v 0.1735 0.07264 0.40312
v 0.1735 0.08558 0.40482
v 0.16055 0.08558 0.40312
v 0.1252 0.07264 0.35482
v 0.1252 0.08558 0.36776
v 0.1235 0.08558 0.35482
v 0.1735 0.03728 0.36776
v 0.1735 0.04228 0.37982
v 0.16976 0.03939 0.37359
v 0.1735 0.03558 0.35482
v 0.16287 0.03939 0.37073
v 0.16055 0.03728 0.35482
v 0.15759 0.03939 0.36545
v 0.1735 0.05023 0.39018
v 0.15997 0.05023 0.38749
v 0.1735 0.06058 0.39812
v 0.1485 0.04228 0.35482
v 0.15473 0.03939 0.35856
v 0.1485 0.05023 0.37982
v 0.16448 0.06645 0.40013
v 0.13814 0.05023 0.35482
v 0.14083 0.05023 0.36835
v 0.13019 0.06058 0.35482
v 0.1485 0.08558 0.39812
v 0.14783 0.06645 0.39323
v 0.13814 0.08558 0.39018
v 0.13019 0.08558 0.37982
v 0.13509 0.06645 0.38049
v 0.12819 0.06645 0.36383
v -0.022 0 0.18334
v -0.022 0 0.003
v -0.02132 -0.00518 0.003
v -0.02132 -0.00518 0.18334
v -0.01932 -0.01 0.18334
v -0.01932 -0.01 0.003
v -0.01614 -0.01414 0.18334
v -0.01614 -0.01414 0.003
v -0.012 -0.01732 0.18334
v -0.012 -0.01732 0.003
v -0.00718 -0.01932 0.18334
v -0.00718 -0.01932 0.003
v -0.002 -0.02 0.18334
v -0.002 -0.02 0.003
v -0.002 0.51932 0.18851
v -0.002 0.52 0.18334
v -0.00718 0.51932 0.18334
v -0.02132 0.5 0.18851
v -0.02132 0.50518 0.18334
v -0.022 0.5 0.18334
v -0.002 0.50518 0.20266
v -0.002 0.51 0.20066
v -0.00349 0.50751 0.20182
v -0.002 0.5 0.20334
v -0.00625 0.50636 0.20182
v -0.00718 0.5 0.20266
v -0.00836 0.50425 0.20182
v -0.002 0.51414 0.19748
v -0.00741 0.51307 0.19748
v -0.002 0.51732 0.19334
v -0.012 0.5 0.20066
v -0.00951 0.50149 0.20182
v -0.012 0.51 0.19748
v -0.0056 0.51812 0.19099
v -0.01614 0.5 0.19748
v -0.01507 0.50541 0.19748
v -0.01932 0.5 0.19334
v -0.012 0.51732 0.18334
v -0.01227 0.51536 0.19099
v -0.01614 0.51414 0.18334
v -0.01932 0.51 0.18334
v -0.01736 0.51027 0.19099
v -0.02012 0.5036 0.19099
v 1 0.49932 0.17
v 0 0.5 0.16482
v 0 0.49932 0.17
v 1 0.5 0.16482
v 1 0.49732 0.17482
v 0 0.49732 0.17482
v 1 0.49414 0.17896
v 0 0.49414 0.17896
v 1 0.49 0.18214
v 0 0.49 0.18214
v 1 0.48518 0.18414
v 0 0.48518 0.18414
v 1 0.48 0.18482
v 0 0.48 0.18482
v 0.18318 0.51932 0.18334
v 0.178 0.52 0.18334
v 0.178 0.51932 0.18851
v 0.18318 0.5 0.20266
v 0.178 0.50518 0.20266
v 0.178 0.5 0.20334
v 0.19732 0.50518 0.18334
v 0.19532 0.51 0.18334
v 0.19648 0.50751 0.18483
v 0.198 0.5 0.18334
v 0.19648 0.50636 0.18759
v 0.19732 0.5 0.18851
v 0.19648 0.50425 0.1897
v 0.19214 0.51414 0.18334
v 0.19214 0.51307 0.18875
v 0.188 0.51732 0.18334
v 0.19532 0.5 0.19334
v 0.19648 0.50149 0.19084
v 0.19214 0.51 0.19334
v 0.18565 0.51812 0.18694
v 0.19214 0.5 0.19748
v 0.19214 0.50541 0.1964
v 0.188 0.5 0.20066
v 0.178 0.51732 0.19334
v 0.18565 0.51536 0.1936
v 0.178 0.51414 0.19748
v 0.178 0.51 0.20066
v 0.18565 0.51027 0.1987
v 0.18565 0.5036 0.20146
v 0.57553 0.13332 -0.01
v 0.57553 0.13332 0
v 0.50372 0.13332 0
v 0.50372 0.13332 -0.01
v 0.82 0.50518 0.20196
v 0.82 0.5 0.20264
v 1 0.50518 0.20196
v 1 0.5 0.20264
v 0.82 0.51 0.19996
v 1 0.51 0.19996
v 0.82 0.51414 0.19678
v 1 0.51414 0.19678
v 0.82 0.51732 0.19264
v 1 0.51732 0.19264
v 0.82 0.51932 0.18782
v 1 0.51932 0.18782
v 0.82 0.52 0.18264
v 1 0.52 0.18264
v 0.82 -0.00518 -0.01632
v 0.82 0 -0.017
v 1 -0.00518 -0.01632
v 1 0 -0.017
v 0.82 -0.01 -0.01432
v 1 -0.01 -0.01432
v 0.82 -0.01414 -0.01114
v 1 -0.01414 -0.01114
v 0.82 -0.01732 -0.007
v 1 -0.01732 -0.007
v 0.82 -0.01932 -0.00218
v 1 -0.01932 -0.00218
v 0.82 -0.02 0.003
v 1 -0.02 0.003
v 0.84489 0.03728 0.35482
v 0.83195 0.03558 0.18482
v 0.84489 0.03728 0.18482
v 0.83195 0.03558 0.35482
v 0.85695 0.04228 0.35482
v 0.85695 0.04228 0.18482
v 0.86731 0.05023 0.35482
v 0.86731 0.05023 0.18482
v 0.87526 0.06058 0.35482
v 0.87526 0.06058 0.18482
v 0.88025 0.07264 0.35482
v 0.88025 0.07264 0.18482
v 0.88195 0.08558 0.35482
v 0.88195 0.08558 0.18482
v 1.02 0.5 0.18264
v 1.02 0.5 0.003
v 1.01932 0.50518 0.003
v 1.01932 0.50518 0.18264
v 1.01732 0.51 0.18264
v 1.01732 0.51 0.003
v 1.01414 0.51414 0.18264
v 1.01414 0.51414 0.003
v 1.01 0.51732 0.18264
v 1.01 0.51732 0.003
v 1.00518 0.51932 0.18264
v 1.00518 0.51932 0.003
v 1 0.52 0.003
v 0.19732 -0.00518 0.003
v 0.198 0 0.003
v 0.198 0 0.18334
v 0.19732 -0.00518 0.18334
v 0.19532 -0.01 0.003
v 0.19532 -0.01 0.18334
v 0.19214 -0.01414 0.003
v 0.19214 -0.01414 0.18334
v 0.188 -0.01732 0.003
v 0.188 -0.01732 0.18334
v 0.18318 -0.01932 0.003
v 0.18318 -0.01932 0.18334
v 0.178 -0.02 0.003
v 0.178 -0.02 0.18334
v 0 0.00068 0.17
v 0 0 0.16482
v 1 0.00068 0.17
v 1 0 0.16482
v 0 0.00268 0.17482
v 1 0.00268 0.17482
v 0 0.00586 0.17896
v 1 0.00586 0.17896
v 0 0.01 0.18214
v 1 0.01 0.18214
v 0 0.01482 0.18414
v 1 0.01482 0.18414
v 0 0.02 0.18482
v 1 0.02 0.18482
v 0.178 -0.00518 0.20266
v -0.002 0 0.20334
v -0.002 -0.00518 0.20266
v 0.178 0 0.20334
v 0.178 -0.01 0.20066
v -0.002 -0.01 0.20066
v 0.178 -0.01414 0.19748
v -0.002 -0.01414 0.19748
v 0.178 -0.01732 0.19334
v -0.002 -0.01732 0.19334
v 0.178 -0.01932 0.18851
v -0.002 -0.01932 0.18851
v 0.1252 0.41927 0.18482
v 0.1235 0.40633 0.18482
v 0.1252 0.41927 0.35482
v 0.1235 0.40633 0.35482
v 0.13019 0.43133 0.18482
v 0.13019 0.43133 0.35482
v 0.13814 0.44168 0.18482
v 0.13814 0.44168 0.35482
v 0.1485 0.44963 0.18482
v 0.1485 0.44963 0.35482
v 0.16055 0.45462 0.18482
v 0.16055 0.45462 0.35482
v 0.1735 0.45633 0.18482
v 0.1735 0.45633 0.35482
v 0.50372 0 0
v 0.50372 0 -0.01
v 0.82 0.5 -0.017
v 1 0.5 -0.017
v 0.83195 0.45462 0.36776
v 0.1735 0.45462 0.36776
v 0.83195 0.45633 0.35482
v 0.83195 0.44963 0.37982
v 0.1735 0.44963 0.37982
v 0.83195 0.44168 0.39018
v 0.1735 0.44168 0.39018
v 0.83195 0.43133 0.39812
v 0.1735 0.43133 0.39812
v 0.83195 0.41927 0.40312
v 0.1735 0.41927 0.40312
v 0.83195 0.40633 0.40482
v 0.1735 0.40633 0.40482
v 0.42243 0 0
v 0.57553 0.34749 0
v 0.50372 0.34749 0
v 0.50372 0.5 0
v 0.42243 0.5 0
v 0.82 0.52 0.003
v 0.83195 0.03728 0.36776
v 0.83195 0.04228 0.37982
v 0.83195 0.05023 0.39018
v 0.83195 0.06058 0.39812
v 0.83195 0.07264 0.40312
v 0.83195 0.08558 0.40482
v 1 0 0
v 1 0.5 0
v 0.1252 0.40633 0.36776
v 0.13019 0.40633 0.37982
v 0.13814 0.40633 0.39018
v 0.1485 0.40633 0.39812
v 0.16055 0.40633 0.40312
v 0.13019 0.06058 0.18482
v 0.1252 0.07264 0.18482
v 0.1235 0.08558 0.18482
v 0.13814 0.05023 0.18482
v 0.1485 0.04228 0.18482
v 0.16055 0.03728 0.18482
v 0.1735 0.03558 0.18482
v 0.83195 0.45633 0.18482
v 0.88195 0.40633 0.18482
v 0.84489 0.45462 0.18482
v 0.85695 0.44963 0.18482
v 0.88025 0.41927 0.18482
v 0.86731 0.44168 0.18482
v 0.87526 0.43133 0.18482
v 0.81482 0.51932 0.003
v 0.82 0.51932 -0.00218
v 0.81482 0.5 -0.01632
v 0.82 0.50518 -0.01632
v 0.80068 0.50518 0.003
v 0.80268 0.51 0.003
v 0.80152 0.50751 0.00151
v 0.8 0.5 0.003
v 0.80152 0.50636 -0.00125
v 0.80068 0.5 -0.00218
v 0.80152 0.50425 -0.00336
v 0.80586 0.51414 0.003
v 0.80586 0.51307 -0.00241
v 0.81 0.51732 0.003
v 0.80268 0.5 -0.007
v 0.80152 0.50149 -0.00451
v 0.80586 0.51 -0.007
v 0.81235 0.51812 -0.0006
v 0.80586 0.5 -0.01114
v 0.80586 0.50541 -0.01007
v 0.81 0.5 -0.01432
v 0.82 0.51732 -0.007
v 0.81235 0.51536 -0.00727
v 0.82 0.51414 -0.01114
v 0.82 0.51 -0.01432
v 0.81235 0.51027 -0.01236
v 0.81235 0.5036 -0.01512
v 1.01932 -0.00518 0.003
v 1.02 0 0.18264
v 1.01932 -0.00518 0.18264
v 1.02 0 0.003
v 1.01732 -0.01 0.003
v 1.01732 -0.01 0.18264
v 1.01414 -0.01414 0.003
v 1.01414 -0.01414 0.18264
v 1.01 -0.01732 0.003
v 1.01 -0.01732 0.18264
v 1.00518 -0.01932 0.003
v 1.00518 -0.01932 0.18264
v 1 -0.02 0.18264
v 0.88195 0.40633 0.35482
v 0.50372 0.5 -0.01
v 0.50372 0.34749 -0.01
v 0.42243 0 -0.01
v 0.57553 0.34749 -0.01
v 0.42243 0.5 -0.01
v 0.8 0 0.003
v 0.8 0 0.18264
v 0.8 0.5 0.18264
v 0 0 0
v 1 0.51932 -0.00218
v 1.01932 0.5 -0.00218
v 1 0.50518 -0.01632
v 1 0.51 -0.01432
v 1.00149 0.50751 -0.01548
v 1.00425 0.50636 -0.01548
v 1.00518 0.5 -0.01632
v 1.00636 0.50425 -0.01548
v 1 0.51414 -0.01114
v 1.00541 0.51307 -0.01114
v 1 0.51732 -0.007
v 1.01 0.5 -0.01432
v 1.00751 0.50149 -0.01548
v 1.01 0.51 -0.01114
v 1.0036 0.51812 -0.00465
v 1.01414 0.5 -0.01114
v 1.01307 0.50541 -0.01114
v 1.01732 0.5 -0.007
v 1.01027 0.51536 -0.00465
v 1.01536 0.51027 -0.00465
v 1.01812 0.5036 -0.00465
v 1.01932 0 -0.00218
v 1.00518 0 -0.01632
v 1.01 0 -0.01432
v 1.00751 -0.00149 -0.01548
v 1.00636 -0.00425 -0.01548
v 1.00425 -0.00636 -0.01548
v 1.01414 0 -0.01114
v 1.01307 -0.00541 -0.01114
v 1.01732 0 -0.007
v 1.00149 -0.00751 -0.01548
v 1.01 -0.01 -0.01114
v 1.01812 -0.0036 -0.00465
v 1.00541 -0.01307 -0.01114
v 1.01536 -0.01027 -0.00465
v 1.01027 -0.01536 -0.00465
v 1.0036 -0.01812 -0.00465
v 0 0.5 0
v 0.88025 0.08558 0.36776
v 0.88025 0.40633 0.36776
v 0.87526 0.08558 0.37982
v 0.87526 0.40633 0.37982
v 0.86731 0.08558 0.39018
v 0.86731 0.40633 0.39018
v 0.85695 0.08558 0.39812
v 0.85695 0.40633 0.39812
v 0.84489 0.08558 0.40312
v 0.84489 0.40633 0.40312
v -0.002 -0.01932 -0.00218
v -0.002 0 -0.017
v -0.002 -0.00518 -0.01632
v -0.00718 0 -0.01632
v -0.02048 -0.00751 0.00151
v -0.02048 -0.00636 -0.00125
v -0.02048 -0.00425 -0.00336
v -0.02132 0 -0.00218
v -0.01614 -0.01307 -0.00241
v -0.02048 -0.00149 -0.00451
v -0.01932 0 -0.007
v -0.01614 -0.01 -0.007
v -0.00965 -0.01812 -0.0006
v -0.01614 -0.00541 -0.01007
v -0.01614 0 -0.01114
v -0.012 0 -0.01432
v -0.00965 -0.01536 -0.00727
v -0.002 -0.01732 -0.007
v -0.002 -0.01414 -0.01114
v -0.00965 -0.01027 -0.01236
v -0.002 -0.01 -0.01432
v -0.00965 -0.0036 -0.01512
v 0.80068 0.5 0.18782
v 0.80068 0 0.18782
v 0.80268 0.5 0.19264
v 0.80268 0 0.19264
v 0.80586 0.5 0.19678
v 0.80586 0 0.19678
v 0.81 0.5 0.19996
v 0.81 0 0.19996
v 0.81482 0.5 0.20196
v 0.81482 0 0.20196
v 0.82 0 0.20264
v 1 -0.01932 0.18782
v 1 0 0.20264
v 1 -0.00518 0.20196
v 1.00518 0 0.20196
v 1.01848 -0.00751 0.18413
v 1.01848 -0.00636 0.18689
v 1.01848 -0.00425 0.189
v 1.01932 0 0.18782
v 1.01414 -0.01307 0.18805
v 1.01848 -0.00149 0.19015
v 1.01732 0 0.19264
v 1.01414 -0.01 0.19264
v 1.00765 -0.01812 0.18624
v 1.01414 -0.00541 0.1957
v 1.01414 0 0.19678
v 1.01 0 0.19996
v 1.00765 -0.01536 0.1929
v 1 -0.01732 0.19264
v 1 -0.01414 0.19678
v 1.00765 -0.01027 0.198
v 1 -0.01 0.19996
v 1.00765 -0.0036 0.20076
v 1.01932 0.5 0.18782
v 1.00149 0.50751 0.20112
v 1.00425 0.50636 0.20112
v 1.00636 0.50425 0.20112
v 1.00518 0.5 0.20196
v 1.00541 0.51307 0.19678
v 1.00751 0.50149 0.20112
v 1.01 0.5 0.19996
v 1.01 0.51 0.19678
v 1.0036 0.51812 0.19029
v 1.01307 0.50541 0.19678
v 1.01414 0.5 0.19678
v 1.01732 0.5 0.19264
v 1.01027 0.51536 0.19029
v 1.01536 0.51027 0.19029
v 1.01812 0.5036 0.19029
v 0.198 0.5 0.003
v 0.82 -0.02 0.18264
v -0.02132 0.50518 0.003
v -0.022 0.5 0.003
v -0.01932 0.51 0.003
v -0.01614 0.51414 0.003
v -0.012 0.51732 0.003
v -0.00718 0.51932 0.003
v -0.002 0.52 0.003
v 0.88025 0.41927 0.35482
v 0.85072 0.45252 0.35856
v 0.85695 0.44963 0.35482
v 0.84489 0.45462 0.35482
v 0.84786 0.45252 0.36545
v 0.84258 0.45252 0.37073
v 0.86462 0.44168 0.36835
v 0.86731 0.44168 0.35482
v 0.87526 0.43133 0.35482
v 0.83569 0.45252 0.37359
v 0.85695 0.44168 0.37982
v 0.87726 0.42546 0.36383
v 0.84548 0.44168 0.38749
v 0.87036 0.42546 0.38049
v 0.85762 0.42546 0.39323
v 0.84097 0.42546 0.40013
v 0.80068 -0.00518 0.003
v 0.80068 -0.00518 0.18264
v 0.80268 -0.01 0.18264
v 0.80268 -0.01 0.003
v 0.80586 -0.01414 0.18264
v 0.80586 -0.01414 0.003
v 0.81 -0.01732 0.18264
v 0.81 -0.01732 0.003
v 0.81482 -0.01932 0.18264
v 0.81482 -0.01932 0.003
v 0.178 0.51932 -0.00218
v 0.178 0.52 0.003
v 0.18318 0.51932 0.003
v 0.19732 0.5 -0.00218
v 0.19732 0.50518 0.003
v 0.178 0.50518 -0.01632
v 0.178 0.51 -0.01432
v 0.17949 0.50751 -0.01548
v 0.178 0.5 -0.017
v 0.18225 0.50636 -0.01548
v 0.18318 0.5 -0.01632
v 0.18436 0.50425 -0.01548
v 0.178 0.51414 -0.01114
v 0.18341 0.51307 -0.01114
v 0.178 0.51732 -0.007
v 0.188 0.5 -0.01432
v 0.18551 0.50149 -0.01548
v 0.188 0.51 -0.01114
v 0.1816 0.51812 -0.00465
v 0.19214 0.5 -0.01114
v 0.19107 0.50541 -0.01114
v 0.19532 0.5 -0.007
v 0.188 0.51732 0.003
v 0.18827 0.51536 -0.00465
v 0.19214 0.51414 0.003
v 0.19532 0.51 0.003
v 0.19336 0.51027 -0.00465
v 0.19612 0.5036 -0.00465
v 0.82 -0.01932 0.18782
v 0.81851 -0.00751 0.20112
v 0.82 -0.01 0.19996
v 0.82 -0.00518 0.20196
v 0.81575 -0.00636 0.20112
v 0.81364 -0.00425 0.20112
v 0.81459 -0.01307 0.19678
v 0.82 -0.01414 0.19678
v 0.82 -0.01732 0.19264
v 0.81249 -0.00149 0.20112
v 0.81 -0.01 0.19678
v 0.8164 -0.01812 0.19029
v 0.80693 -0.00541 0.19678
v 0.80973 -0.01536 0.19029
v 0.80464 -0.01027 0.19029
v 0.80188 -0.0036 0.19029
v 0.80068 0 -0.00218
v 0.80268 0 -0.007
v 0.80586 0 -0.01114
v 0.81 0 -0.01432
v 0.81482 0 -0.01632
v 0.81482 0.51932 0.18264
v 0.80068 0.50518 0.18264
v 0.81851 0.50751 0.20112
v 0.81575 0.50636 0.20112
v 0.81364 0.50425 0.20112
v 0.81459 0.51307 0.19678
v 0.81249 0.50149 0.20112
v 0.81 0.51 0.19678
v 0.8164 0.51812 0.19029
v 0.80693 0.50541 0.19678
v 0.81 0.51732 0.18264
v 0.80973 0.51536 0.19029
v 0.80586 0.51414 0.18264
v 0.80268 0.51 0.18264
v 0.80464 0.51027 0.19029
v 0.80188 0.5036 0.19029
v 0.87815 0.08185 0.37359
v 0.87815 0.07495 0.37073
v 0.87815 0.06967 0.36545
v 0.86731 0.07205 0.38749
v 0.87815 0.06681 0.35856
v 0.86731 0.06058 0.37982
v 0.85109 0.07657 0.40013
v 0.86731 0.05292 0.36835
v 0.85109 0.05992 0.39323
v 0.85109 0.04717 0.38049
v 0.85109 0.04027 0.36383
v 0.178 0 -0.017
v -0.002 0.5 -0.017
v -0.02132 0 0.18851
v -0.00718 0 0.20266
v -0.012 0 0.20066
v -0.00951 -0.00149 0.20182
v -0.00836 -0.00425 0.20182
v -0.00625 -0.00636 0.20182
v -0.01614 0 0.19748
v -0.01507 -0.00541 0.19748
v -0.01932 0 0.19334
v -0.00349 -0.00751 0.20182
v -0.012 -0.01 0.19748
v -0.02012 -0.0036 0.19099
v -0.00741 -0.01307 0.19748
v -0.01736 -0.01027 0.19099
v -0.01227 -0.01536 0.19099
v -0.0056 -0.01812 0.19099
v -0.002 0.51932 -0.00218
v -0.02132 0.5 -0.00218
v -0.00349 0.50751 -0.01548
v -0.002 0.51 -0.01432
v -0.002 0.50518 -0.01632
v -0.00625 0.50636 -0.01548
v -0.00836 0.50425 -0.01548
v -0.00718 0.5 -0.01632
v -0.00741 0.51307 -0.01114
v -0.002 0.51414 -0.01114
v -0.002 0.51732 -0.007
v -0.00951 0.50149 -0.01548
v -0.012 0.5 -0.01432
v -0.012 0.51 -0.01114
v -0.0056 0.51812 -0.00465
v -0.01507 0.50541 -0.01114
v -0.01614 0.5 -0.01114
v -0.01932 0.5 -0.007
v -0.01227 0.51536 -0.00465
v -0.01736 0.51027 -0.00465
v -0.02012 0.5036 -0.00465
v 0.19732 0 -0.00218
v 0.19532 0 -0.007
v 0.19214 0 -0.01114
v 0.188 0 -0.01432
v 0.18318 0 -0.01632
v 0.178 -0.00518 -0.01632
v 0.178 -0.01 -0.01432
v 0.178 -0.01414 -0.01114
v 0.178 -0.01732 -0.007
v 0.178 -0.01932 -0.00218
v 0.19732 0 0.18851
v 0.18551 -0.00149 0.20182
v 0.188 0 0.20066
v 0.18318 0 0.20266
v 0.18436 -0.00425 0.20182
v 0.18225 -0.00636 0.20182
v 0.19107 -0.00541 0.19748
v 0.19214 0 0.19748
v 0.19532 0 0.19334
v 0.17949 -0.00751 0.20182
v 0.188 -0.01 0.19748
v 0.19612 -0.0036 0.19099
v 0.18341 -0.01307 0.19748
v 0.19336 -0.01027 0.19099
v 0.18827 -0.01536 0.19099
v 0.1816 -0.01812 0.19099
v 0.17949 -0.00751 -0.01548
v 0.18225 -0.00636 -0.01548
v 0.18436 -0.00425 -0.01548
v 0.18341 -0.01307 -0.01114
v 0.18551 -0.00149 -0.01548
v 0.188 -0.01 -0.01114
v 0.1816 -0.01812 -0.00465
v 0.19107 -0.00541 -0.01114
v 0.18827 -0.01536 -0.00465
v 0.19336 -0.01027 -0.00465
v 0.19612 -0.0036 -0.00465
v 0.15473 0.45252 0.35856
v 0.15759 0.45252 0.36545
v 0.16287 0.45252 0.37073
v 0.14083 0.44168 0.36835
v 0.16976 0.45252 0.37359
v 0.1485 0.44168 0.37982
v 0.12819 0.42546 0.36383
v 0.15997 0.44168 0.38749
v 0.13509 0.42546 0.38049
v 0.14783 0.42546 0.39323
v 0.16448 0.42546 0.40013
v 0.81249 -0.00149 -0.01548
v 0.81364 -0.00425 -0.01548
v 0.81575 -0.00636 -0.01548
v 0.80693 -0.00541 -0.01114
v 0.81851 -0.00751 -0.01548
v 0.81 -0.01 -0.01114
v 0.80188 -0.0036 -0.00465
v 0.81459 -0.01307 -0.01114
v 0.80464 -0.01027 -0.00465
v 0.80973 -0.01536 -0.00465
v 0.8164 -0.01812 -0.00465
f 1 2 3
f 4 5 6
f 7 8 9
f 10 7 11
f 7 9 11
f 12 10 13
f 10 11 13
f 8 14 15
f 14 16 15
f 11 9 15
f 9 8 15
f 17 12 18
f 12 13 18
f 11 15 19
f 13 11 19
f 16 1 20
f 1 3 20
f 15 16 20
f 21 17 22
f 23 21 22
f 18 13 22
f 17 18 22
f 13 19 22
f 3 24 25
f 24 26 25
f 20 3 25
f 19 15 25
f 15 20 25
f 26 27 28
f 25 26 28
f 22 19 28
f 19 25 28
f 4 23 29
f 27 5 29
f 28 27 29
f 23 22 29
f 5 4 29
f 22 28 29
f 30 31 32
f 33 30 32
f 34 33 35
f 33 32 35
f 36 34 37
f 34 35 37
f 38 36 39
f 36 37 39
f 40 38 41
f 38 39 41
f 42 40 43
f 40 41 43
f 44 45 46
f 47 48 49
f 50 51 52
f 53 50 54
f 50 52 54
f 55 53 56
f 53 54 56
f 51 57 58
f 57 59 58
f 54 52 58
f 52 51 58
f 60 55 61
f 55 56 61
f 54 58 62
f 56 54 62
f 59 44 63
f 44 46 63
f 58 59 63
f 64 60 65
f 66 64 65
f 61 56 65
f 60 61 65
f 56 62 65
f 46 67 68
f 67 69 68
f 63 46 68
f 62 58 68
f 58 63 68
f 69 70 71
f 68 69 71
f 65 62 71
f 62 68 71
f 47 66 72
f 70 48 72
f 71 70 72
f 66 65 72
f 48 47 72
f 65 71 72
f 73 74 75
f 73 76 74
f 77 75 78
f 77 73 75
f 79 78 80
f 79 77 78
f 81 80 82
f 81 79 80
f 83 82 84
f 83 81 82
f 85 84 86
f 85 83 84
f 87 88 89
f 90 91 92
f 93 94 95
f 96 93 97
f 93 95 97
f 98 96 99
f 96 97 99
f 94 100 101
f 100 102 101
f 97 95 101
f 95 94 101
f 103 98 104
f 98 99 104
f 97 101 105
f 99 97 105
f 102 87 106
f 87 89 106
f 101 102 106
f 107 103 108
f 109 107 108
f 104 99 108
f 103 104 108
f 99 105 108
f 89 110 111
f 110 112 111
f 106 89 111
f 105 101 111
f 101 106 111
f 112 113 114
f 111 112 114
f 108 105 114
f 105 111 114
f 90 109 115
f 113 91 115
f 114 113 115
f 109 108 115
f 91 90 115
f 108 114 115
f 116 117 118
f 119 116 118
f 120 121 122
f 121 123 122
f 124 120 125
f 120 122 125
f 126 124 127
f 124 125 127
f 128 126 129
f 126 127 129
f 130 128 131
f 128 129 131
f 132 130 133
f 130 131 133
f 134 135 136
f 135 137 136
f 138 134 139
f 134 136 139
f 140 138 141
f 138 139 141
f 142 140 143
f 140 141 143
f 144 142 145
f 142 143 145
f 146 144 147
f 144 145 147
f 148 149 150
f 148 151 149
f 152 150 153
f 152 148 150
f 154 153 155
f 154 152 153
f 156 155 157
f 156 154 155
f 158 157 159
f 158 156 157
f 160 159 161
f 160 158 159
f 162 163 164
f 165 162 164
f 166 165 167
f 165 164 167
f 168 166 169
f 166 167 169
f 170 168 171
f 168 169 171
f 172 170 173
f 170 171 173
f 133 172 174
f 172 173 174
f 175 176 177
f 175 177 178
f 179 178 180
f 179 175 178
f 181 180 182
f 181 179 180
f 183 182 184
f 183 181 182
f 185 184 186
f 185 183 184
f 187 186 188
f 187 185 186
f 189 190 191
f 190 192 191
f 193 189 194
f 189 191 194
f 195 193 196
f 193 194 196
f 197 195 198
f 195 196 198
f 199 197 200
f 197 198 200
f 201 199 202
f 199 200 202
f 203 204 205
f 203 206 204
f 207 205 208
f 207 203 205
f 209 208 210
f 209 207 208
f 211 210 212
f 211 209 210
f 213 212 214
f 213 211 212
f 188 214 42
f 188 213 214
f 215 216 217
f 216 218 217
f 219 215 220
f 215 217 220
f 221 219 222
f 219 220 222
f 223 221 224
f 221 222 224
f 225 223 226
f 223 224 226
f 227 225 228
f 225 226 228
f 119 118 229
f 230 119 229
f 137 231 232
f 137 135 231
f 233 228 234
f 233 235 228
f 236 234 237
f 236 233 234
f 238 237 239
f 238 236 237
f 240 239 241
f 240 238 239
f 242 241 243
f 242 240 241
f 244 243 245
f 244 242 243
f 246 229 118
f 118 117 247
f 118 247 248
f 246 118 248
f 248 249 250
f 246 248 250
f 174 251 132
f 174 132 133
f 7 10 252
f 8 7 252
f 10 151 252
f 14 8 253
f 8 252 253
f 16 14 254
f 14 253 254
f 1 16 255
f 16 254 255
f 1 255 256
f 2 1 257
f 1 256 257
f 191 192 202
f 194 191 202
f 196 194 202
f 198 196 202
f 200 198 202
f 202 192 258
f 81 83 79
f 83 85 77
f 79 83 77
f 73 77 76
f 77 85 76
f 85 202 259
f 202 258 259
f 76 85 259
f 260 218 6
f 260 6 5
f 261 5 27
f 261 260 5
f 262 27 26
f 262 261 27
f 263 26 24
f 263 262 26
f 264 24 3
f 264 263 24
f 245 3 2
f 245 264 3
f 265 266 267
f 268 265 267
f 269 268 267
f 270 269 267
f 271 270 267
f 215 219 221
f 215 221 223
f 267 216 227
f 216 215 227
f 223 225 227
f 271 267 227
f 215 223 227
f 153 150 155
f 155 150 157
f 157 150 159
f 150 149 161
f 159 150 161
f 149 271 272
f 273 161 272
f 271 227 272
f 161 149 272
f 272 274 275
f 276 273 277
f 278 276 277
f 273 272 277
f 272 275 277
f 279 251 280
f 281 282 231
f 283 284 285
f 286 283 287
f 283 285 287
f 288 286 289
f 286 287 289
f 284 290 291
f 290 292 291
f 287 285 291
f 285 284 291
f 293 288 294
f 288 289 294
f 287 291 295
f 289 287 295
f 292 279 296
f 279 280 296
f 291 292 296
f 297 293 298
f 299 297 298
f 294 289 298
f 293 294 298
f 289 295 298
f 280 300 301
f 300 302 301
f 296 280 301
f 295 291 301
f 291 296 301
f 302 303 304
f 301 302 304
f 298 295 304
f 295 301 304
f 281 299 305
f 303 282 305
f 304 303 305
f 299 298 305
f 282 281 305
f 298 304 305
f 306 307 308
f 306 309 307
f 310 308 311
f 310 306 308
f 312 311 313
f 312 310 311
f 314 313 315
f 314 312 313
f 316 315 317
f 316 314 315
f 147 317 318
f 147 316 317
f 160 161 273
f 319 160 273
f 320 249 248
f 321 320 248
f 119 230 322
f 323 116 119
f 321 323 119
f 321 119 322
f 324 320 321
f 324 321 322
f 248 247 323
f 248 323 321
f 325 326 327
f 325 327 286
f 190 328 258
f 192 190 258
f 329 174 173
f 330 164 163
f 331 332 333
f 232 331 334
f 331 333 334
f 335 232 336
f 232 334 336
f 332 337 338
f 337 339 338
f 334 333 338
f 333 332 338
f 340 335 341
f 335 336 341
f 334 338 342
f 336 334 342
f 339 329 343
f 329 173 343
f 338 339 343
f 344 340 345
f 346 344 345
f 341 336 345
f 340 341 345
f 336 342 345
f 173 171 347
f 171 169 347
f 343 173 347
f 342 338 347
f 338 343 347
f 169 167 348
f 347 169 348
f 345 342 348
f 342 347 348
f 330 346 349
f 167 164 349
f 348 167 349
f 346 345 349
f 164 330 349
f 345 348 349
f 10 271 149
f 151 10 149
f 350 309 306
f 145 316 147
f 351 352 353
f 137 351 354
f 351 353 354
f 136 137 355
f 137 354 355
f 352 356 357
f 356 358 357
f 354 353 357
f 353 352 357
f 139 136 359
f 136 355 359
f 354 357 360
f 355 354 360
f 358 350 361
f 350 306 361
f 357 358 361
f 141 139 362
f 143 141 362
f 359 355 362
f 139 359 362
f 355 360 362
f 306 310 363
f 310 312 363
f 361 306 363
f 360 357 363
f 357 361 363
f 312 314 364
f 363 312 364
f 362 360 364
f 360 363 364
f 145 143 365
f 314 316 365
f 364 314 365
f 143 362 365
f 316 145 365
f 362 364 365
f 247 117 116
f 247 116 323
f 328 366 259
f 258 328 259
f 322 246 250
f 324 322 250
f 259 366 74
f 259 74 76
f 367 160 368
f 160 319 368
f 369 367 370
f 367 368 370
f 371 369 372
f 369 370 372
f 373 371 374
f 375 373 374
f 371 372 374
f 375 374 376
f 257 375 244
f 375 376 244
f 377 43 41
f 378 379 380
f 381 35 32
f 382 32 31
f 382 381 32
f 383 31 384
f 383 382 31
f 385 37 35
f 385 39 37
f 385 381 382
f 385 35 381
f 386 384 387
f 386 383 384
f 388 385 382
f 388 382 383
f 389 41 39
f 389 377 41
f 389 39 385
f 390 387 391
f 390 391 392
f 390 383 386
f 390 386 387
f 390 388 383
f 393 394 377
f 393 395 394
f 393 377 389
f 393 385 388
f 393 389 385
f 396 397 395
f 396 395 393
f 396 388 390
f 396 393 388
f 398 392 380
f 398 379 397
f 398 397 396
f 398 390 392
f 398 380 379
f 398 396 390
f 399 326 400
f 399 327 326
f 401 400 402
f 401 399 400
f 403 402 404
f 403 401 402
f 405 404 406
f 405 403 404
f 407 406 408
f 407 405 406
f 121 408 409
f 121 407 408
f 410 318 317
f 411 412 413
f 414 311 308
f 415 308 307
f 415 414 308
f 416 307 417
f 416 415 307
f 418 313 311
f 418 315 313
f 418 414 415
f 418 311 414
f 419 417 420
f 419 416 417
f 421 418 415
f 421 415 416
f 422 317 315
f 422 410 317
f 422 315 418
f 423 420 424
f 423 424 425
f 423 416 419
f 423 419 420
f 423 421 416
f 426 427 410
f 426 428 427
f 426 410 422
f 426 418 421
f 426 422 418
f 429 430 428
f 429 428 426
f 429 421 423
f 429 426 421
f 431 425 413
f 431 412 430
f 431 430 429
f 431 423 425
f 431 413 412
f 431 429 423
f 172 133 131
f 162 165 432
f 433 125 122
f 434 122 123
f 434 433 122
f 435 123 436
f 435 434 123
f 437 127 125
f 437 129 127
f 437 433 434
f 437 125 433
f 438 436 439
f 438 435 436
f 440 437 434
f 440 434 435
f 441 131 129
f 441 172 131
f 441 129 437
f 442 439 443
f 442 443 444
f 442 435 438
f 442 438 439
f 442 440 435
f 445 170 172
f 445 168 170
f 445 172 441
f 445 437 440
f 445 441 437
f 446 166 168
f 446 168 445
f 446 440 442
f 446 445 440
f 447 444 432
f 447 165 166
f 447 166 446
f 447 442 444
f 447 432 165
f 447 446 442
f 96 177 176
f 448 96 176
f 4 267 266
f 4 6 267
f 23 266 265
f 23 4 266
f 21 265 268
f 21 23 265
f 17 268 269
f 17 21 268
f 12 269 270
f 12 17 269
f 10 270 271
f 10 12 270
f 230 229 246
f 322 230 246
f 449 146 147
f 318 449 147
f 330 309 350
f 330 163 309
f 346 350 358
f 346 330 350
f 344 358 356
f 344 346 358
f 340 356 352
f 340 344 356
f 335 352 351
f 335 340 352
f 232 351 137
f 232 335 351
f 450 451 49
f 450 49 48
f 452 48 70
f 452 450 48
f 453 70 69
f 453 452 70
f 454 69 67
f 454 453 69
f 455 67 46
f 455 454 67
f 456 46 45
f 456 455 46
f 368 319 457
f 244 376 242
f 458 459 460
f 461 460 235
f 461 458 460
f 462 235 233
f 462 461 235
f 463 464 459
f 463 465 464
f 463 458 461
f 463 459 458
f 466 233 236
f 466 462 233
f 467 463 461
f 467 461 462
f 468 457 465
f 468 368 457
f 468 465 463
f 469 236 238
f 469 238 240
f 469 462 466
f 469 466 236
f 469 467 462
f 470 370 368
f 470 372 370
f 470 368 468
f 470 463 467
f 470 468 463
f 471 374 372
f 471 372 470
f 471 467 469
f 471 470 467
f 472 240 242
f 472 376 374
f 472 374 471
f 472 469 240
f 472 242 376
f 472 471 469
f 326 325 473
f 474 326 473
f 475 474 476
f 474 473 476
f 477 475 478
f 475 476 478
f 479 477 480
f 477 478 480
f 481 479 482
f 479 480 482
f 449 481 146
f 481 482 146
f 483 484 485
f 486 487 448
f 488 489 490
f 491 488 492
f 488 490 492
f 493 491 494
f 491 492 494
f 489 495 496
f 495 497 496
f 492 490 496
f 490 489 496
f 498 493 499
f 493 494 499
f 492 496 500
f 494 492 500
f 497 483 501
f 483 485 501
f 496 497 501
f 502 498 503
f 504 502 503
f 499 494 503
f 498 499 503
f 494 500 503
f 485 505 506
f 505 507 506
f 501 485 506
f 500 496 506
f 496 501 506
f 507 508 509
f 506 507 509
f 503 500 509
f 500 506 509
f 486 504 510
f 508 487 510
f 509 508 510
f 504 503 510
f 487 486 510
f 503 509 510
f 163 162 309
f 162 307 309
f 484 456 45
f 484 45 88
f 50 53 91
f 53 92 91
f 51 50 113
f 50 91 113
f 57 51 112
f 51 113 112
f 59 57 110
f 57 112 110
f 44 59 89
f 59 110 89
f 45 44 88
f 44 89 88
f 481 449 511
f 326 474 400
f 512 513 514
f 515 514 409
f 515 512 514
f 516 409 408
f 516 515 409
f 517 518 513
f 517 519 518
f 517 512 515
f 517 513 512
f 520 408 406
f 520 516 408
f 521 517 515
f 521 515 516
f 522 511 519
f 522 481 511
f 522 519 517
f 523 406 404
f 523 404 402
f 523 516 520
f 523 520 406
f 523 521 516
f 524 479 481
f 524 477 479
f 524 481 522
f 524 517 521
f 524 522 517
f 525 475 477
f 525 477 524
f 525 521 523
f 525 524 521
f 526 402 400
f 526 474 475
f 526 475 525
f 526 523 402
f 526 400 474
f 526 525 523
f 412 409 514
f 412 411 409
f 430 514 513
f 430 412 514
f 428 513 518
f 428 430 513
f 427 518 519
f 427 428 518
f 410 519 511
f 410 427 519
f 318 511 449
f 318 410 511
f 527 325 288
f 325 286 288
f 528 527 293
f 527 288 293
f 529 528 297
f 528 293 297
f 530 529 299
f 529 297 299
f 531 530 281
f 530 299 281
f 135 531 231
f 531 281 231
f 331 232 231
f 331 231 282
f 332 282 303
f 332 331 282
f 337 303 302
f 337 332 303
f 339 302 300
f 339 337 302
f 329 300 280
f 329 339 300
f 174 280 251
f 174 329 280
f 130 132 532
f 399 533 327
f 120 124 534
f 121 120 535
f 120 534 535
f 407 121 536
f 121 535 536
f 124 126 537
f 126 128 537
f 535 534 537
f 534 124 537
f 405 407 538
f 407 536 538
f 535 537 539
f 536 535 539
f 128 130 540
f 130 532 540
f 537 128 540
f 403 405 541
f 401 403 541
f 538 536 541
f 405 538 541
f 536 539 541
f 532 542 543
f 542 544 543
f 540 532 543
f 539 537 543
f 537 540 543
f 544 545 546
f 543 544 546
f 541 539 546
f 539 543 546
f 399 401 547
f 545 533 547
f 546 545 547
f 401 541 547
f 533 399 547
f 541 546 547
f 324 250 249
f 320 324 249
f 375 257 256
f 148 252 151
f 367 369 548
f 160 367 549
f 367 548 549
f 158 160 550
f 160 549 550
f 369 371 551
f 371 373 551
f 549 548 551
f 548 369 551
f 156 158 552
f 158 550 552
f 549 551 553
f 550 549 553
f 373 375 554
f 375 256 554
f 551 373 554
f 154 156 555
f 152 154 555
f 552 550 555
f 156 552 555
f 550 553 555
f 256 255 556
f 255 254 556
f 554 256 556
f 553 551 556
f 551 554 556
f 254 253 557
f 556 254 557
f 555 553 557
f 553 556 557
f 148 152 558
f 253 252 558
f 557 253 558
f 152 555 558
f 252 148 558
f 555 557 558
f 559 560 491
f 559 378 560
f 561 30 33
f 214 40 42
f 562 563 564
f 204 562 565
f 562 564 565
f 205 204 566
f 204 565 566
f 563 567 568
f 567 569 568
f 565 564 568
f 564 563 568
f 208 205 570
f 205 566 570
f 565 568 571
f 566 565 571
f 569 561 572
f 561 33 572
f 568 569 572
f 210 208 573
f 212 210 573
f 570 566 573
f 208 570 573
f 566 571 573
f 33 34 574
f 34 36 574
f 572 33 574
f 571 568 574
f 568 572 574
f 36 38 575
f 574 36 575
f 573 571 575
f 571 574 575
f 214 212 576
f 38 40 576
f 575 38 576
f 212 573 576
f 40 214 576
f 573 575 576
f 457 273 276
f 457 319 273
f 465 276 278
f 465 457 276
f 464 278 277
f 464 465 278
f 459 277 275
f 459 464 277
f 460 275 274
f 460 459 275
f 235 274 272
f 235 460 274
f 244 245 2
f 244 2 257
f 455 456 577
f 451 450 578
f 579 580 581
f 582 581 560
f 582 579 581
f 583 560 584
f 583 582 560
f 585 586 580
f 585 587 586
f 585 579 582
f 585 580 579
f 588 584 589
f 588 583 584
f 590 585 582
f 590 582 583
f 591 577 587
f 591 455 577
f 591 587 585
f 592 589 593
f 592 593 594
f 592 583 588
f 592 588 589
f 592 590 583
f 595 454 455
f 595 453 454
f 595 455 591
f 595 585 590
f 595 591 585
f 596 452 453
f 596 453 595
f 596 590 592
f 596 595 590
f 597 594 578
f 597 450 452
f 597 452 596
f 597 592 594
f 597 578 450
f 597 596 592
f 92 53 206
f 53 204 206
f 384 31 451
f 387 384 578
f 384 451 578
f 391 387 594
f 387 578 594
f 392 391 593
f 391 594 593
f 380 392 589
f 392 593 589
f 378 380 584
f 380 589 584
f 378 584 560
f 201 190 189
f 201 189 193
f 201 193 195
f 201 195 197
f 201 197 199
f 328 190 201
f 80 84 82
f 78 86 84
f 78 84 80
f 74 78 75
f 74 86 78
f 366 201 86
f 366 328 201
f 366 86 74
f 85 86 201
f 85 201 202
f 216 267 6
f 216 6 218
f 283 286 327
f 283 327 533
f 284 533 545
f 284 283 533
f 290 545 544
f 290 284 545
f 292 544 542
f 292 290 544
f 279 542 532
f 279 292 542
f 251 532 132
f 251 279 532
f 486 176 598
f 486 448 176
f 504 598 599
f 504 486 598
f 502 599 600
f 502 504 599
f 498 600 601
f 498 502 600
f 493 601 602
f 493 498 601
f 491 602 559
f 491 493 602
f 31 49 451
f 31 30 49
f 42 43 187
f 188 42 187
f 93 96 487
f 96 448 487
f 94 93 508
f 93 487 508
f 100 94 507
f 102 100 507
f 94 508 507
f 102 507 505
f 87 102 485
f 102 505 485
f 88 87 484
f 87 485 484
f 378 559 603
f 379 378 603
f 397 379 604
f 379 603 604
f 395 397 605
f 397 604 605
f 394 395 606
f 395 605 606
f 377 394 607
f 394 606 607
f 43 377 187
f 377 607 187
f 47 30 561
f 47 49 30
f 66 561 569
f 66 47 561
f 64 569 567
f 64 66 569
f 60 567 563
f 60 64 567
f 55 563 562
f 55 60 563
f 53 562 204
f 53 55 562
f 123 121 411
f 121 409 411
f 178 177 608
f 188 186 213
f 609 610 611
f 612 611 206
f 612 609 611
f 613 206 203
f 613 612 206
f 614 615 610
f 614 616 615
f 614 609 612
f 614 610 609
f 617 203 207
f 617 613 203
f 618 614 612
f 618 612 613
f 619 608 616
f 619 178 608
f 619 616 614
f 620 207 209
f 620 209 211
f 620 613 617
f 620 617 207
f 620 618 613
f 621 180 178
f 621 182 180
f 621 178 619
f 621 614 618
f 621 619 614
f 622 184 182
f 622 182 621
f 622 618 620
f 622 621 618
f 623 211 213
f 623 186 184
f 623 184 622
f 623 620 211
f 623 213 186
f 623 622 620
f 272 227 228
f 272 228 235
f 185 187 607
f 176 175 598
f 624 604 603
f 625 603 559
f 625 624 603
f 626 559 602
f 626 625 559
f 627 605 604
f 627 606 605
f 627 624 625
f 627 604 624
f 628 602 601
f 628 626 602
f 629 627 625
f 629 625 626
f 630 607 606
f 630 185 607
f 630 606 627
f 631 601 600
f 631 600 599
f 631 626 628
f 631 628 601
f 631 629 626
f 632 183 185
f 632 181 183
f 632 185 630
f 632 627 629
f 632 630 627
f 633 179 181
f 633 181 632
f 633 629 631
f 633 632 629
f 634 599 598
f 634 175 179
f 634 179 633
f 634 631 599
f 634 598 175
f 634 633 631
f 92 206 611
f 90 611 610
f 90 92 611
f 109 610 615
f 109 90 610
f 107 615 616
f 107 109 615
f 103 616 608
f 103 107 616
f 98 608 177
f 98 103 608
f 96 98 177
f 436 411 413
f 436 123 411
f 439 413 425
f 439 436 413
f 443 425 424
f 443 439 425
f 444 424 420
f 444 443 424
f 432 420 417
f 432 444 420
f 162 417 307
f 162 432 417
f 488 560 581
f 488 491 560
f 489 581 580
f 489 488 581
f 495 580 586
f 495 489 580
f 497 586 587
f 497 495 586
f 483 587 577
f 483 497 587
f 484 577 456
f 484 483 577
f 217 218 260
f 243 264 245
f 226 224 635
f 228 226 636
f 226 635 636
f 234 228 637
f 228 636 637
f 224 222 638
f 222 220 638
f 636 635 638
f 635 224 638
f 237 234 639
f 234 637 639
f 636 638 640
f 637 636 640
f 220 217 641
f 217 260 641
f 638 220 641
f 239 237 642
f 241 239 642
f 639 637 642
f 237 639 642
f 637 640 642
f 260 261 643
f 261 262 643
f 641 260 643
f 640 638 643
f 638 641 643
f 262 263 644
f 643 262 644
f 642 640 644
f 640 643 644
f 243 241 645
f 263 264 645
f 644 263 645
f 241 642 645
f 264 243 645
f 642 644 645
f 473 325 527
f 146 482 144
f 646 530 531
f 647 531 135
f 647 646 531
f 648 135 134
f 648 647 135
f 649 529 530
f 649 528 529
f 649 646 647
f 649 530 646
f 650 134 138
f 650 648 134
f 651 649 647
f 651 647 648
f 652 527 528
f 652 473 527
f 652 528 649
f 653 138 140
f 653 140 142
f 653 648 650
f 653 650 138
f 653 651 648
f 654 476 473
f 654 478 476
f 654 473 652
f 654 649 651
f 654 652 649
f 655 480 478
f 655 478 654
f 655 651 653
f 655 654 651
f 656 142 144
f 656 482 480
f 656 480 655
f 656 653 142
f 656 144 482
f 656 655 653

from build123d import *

# Parameters (mm, degrees)
SKETCH3_W                  = 1
SKETCH3_H                  = 0.5
BOSS_EXTRUDE1_DEPTH        = 0.184822483
SKETCH6_W                  = 0.071813071
SKETCH6_H                  = 0.214176685
BOSS_EXTRUDE5_DEPTH        = 0.01
BOSS_EXTRUDE9_DEPTH        = 0.52
BOSS_EXTRUDE9_DEPTH_BACK   = 0.02
SKETCH4_W                  = 0.22
SKETCH4_H                  = 0.220337521
BOSS_EXTRUDE9_2_DEPTH      = 0.52
BOSS_EXTRUDE9_2_DEPTH_BACK = 0.02
SKETCH4_H_2                = 0.21963888
SKETCH7_W                  = 0.758458257
SKETCH7_H                  = 0.420745525
BOSS_EXTRUDE10_DEPTH       = 0.22
FILLET4_R                  = 0.05
FILLET7_R                  = 0.02
FILLET8_R                  = 0.02
FILLET9_R                  = 0.02


with BuildPart() as part:
    # Sketch3 → Boss-Extrude1 (new body)
    with BuildSketch(Plane.XY):
        with Locations((0.5, 0.25)):
            Rectangle(SKETCH3_W, SKETCH3_H)
    extrude(amount=BOSS_EXTRUDE1_DEPTH)

    # Fillet9
    fillet9_edges = [part.edges().sort_by_distance(p)[0] for p in [
        (0.5, 0.5, 0.184822483),
        (0.5, 0, 0.184822483),
    ]]
    fillet(fillet9_edges, radius=FILLET9_R)


with BuildPart() as body_2:
    # Sketch6 → Boss-Extrude5 (new body)
    with BuildSketch(Plane(origin=(0, 0, 0), x_dir=(-1, 0, 0), z_dir=(0, 0, -1))):
        Polygon((-0.503719115, 0), (-0.422427341, 0), (-0.422427341, 0.5), (-0.503719115, 0.5), (-0.503719115, 0.347493202), (-0.503719115, 0.133316517), align=None)
        with Locations((-0.53962565, 0.24040486)):
            Rectangle(SKETCH6_W, SKETCH6_H)
    extrude(amount=BOSS_EXTRUDE5_DEPTH)


with BuildPart() as body_3:
    # Sketch4 → Boss-Extrude9 (new, two sides: drawn at the far end of the back side and taken through both)
    with BuildSketch(Plane(origin=(0, 0, 0), x_dir=(1, 0, 0), z_dir=(0, 1, 0)).offset(-BOSS_EXTRUDE9_DEPTH_BACK)):
        with Locations((0.088, -0.093168761)):
            Rectangle(SKETCH4_W, SKETCH4_H)
    extrude(amount=BOSS_EXTRUDE9_DEPTH + BOSS_EXTRUDE9_DEPTH_BACK)

    # Fillet8
    fillet8_edges = [body_3.edges().sort_by_distance(p)[0] for p in [
        (-0.022, 0.52, 0.093168761),
        (0.198, -0.02, 0.093168761),
        (0.088, 0.52, 0.203337521),
        (0.198, 0.52, 0.093168761),
        (0.088, 0.52, -0.017),
        (0.088, -0.02, -0.017),
        (-0.022, -0.02, 0.093168761),
        (-0.022, 0.25, -0.017),
        (0.198, 0.25, -0.017),
        (0.198, 0.25, 0.203337521),
        (-0.022, 0.25, 0.203337521),
        (0.088, -0.02, 0.203337521),
    ]]
    fillet(fillet8_edges, radius=FILLET8_R)


with BuildPart() as body_4:
    # Sketch4 → Boss-Extrude9 2 (new, two sides: drawn at the far end of the back side and taken through both)
    with BuildSketch(Plane(origin=(0, 0, 0), x_dir=(1, 0, 0), z_dir=(0, 1, 0)).offset(-BOSS_EXTRUDE9_2_DEPTH_BACK)):
        with Locations((0.91, -0.09281944)):
            Rectangle(SKETCH4_W, SKETCH4_H_2)
    extrude(amount=BOSS_EXTRUDE9_2_DEPTH + BOSS_EXTRUDE9_2_DEPTH_BACK)

    # Fillet7
    fillet7_edges = [body_4.edges().sort_by_distance(p)[0] for p in [
        (1.02, 0.52, 0.09281944),
        (0.8, -0.02, 0.09281944),
        (0.91, 0.52, -0.017),
        (0.8, 0.52, 0.09281944),
        (0.91, 0.52, 0.20263888),
        (0.91, -0.02, 0.20263888),
        (1.02, -0.02, 0.09281944),
        (1.02, 0.25, 0.20263888),
        (0.8, 0.25, 0.20263888),
        (0.8, 0.25, -0.017),
        (1.02, 0.25, -0.017),
        (0.91, -0.02, -0.017),
    ]]
    fillet(fillet7_edges, radius=FILLET7_R)


with BuildPart() as body_5:
    # Sketch7 → Boss-Extrude10 (new body)
    with BuildSketch(Plane.XY.offset(0.184822483)):
        with Locations((0.502724716, 0.24595369)):
            Rectangle(SKETCH7_W, SKETCH7_H)
    extrude(amount=BOSS_EXTRUDE10_DEPTH)

    # Fillet4
    fillet4_edges = [body_5.edges().sort_by_distance(p)[0] for p in [
        (0.123495587, 0.24595369, 0.404822483),
        (0.502724715, 0.035580927, 0.404822483),
        (0.881953844, 0.24595369, 0.404822483),
        (0.881953844, 0.035580927, 0.294822483),
        (0.123495587, 0.035580927, 0.294822483),
        (0.123495587, 0.456326452, 0.294822483),
        (0.881953844, 0.456326452, 0.294822483),
        (0.502724715, 0.456326452, 0.404822483),
    ]]
    fillet(fillet4_edges, radius=FILLET4_R)


solid = Compound([part.part, body_2.part, body_3.part, body_4.part, body_5.part])
